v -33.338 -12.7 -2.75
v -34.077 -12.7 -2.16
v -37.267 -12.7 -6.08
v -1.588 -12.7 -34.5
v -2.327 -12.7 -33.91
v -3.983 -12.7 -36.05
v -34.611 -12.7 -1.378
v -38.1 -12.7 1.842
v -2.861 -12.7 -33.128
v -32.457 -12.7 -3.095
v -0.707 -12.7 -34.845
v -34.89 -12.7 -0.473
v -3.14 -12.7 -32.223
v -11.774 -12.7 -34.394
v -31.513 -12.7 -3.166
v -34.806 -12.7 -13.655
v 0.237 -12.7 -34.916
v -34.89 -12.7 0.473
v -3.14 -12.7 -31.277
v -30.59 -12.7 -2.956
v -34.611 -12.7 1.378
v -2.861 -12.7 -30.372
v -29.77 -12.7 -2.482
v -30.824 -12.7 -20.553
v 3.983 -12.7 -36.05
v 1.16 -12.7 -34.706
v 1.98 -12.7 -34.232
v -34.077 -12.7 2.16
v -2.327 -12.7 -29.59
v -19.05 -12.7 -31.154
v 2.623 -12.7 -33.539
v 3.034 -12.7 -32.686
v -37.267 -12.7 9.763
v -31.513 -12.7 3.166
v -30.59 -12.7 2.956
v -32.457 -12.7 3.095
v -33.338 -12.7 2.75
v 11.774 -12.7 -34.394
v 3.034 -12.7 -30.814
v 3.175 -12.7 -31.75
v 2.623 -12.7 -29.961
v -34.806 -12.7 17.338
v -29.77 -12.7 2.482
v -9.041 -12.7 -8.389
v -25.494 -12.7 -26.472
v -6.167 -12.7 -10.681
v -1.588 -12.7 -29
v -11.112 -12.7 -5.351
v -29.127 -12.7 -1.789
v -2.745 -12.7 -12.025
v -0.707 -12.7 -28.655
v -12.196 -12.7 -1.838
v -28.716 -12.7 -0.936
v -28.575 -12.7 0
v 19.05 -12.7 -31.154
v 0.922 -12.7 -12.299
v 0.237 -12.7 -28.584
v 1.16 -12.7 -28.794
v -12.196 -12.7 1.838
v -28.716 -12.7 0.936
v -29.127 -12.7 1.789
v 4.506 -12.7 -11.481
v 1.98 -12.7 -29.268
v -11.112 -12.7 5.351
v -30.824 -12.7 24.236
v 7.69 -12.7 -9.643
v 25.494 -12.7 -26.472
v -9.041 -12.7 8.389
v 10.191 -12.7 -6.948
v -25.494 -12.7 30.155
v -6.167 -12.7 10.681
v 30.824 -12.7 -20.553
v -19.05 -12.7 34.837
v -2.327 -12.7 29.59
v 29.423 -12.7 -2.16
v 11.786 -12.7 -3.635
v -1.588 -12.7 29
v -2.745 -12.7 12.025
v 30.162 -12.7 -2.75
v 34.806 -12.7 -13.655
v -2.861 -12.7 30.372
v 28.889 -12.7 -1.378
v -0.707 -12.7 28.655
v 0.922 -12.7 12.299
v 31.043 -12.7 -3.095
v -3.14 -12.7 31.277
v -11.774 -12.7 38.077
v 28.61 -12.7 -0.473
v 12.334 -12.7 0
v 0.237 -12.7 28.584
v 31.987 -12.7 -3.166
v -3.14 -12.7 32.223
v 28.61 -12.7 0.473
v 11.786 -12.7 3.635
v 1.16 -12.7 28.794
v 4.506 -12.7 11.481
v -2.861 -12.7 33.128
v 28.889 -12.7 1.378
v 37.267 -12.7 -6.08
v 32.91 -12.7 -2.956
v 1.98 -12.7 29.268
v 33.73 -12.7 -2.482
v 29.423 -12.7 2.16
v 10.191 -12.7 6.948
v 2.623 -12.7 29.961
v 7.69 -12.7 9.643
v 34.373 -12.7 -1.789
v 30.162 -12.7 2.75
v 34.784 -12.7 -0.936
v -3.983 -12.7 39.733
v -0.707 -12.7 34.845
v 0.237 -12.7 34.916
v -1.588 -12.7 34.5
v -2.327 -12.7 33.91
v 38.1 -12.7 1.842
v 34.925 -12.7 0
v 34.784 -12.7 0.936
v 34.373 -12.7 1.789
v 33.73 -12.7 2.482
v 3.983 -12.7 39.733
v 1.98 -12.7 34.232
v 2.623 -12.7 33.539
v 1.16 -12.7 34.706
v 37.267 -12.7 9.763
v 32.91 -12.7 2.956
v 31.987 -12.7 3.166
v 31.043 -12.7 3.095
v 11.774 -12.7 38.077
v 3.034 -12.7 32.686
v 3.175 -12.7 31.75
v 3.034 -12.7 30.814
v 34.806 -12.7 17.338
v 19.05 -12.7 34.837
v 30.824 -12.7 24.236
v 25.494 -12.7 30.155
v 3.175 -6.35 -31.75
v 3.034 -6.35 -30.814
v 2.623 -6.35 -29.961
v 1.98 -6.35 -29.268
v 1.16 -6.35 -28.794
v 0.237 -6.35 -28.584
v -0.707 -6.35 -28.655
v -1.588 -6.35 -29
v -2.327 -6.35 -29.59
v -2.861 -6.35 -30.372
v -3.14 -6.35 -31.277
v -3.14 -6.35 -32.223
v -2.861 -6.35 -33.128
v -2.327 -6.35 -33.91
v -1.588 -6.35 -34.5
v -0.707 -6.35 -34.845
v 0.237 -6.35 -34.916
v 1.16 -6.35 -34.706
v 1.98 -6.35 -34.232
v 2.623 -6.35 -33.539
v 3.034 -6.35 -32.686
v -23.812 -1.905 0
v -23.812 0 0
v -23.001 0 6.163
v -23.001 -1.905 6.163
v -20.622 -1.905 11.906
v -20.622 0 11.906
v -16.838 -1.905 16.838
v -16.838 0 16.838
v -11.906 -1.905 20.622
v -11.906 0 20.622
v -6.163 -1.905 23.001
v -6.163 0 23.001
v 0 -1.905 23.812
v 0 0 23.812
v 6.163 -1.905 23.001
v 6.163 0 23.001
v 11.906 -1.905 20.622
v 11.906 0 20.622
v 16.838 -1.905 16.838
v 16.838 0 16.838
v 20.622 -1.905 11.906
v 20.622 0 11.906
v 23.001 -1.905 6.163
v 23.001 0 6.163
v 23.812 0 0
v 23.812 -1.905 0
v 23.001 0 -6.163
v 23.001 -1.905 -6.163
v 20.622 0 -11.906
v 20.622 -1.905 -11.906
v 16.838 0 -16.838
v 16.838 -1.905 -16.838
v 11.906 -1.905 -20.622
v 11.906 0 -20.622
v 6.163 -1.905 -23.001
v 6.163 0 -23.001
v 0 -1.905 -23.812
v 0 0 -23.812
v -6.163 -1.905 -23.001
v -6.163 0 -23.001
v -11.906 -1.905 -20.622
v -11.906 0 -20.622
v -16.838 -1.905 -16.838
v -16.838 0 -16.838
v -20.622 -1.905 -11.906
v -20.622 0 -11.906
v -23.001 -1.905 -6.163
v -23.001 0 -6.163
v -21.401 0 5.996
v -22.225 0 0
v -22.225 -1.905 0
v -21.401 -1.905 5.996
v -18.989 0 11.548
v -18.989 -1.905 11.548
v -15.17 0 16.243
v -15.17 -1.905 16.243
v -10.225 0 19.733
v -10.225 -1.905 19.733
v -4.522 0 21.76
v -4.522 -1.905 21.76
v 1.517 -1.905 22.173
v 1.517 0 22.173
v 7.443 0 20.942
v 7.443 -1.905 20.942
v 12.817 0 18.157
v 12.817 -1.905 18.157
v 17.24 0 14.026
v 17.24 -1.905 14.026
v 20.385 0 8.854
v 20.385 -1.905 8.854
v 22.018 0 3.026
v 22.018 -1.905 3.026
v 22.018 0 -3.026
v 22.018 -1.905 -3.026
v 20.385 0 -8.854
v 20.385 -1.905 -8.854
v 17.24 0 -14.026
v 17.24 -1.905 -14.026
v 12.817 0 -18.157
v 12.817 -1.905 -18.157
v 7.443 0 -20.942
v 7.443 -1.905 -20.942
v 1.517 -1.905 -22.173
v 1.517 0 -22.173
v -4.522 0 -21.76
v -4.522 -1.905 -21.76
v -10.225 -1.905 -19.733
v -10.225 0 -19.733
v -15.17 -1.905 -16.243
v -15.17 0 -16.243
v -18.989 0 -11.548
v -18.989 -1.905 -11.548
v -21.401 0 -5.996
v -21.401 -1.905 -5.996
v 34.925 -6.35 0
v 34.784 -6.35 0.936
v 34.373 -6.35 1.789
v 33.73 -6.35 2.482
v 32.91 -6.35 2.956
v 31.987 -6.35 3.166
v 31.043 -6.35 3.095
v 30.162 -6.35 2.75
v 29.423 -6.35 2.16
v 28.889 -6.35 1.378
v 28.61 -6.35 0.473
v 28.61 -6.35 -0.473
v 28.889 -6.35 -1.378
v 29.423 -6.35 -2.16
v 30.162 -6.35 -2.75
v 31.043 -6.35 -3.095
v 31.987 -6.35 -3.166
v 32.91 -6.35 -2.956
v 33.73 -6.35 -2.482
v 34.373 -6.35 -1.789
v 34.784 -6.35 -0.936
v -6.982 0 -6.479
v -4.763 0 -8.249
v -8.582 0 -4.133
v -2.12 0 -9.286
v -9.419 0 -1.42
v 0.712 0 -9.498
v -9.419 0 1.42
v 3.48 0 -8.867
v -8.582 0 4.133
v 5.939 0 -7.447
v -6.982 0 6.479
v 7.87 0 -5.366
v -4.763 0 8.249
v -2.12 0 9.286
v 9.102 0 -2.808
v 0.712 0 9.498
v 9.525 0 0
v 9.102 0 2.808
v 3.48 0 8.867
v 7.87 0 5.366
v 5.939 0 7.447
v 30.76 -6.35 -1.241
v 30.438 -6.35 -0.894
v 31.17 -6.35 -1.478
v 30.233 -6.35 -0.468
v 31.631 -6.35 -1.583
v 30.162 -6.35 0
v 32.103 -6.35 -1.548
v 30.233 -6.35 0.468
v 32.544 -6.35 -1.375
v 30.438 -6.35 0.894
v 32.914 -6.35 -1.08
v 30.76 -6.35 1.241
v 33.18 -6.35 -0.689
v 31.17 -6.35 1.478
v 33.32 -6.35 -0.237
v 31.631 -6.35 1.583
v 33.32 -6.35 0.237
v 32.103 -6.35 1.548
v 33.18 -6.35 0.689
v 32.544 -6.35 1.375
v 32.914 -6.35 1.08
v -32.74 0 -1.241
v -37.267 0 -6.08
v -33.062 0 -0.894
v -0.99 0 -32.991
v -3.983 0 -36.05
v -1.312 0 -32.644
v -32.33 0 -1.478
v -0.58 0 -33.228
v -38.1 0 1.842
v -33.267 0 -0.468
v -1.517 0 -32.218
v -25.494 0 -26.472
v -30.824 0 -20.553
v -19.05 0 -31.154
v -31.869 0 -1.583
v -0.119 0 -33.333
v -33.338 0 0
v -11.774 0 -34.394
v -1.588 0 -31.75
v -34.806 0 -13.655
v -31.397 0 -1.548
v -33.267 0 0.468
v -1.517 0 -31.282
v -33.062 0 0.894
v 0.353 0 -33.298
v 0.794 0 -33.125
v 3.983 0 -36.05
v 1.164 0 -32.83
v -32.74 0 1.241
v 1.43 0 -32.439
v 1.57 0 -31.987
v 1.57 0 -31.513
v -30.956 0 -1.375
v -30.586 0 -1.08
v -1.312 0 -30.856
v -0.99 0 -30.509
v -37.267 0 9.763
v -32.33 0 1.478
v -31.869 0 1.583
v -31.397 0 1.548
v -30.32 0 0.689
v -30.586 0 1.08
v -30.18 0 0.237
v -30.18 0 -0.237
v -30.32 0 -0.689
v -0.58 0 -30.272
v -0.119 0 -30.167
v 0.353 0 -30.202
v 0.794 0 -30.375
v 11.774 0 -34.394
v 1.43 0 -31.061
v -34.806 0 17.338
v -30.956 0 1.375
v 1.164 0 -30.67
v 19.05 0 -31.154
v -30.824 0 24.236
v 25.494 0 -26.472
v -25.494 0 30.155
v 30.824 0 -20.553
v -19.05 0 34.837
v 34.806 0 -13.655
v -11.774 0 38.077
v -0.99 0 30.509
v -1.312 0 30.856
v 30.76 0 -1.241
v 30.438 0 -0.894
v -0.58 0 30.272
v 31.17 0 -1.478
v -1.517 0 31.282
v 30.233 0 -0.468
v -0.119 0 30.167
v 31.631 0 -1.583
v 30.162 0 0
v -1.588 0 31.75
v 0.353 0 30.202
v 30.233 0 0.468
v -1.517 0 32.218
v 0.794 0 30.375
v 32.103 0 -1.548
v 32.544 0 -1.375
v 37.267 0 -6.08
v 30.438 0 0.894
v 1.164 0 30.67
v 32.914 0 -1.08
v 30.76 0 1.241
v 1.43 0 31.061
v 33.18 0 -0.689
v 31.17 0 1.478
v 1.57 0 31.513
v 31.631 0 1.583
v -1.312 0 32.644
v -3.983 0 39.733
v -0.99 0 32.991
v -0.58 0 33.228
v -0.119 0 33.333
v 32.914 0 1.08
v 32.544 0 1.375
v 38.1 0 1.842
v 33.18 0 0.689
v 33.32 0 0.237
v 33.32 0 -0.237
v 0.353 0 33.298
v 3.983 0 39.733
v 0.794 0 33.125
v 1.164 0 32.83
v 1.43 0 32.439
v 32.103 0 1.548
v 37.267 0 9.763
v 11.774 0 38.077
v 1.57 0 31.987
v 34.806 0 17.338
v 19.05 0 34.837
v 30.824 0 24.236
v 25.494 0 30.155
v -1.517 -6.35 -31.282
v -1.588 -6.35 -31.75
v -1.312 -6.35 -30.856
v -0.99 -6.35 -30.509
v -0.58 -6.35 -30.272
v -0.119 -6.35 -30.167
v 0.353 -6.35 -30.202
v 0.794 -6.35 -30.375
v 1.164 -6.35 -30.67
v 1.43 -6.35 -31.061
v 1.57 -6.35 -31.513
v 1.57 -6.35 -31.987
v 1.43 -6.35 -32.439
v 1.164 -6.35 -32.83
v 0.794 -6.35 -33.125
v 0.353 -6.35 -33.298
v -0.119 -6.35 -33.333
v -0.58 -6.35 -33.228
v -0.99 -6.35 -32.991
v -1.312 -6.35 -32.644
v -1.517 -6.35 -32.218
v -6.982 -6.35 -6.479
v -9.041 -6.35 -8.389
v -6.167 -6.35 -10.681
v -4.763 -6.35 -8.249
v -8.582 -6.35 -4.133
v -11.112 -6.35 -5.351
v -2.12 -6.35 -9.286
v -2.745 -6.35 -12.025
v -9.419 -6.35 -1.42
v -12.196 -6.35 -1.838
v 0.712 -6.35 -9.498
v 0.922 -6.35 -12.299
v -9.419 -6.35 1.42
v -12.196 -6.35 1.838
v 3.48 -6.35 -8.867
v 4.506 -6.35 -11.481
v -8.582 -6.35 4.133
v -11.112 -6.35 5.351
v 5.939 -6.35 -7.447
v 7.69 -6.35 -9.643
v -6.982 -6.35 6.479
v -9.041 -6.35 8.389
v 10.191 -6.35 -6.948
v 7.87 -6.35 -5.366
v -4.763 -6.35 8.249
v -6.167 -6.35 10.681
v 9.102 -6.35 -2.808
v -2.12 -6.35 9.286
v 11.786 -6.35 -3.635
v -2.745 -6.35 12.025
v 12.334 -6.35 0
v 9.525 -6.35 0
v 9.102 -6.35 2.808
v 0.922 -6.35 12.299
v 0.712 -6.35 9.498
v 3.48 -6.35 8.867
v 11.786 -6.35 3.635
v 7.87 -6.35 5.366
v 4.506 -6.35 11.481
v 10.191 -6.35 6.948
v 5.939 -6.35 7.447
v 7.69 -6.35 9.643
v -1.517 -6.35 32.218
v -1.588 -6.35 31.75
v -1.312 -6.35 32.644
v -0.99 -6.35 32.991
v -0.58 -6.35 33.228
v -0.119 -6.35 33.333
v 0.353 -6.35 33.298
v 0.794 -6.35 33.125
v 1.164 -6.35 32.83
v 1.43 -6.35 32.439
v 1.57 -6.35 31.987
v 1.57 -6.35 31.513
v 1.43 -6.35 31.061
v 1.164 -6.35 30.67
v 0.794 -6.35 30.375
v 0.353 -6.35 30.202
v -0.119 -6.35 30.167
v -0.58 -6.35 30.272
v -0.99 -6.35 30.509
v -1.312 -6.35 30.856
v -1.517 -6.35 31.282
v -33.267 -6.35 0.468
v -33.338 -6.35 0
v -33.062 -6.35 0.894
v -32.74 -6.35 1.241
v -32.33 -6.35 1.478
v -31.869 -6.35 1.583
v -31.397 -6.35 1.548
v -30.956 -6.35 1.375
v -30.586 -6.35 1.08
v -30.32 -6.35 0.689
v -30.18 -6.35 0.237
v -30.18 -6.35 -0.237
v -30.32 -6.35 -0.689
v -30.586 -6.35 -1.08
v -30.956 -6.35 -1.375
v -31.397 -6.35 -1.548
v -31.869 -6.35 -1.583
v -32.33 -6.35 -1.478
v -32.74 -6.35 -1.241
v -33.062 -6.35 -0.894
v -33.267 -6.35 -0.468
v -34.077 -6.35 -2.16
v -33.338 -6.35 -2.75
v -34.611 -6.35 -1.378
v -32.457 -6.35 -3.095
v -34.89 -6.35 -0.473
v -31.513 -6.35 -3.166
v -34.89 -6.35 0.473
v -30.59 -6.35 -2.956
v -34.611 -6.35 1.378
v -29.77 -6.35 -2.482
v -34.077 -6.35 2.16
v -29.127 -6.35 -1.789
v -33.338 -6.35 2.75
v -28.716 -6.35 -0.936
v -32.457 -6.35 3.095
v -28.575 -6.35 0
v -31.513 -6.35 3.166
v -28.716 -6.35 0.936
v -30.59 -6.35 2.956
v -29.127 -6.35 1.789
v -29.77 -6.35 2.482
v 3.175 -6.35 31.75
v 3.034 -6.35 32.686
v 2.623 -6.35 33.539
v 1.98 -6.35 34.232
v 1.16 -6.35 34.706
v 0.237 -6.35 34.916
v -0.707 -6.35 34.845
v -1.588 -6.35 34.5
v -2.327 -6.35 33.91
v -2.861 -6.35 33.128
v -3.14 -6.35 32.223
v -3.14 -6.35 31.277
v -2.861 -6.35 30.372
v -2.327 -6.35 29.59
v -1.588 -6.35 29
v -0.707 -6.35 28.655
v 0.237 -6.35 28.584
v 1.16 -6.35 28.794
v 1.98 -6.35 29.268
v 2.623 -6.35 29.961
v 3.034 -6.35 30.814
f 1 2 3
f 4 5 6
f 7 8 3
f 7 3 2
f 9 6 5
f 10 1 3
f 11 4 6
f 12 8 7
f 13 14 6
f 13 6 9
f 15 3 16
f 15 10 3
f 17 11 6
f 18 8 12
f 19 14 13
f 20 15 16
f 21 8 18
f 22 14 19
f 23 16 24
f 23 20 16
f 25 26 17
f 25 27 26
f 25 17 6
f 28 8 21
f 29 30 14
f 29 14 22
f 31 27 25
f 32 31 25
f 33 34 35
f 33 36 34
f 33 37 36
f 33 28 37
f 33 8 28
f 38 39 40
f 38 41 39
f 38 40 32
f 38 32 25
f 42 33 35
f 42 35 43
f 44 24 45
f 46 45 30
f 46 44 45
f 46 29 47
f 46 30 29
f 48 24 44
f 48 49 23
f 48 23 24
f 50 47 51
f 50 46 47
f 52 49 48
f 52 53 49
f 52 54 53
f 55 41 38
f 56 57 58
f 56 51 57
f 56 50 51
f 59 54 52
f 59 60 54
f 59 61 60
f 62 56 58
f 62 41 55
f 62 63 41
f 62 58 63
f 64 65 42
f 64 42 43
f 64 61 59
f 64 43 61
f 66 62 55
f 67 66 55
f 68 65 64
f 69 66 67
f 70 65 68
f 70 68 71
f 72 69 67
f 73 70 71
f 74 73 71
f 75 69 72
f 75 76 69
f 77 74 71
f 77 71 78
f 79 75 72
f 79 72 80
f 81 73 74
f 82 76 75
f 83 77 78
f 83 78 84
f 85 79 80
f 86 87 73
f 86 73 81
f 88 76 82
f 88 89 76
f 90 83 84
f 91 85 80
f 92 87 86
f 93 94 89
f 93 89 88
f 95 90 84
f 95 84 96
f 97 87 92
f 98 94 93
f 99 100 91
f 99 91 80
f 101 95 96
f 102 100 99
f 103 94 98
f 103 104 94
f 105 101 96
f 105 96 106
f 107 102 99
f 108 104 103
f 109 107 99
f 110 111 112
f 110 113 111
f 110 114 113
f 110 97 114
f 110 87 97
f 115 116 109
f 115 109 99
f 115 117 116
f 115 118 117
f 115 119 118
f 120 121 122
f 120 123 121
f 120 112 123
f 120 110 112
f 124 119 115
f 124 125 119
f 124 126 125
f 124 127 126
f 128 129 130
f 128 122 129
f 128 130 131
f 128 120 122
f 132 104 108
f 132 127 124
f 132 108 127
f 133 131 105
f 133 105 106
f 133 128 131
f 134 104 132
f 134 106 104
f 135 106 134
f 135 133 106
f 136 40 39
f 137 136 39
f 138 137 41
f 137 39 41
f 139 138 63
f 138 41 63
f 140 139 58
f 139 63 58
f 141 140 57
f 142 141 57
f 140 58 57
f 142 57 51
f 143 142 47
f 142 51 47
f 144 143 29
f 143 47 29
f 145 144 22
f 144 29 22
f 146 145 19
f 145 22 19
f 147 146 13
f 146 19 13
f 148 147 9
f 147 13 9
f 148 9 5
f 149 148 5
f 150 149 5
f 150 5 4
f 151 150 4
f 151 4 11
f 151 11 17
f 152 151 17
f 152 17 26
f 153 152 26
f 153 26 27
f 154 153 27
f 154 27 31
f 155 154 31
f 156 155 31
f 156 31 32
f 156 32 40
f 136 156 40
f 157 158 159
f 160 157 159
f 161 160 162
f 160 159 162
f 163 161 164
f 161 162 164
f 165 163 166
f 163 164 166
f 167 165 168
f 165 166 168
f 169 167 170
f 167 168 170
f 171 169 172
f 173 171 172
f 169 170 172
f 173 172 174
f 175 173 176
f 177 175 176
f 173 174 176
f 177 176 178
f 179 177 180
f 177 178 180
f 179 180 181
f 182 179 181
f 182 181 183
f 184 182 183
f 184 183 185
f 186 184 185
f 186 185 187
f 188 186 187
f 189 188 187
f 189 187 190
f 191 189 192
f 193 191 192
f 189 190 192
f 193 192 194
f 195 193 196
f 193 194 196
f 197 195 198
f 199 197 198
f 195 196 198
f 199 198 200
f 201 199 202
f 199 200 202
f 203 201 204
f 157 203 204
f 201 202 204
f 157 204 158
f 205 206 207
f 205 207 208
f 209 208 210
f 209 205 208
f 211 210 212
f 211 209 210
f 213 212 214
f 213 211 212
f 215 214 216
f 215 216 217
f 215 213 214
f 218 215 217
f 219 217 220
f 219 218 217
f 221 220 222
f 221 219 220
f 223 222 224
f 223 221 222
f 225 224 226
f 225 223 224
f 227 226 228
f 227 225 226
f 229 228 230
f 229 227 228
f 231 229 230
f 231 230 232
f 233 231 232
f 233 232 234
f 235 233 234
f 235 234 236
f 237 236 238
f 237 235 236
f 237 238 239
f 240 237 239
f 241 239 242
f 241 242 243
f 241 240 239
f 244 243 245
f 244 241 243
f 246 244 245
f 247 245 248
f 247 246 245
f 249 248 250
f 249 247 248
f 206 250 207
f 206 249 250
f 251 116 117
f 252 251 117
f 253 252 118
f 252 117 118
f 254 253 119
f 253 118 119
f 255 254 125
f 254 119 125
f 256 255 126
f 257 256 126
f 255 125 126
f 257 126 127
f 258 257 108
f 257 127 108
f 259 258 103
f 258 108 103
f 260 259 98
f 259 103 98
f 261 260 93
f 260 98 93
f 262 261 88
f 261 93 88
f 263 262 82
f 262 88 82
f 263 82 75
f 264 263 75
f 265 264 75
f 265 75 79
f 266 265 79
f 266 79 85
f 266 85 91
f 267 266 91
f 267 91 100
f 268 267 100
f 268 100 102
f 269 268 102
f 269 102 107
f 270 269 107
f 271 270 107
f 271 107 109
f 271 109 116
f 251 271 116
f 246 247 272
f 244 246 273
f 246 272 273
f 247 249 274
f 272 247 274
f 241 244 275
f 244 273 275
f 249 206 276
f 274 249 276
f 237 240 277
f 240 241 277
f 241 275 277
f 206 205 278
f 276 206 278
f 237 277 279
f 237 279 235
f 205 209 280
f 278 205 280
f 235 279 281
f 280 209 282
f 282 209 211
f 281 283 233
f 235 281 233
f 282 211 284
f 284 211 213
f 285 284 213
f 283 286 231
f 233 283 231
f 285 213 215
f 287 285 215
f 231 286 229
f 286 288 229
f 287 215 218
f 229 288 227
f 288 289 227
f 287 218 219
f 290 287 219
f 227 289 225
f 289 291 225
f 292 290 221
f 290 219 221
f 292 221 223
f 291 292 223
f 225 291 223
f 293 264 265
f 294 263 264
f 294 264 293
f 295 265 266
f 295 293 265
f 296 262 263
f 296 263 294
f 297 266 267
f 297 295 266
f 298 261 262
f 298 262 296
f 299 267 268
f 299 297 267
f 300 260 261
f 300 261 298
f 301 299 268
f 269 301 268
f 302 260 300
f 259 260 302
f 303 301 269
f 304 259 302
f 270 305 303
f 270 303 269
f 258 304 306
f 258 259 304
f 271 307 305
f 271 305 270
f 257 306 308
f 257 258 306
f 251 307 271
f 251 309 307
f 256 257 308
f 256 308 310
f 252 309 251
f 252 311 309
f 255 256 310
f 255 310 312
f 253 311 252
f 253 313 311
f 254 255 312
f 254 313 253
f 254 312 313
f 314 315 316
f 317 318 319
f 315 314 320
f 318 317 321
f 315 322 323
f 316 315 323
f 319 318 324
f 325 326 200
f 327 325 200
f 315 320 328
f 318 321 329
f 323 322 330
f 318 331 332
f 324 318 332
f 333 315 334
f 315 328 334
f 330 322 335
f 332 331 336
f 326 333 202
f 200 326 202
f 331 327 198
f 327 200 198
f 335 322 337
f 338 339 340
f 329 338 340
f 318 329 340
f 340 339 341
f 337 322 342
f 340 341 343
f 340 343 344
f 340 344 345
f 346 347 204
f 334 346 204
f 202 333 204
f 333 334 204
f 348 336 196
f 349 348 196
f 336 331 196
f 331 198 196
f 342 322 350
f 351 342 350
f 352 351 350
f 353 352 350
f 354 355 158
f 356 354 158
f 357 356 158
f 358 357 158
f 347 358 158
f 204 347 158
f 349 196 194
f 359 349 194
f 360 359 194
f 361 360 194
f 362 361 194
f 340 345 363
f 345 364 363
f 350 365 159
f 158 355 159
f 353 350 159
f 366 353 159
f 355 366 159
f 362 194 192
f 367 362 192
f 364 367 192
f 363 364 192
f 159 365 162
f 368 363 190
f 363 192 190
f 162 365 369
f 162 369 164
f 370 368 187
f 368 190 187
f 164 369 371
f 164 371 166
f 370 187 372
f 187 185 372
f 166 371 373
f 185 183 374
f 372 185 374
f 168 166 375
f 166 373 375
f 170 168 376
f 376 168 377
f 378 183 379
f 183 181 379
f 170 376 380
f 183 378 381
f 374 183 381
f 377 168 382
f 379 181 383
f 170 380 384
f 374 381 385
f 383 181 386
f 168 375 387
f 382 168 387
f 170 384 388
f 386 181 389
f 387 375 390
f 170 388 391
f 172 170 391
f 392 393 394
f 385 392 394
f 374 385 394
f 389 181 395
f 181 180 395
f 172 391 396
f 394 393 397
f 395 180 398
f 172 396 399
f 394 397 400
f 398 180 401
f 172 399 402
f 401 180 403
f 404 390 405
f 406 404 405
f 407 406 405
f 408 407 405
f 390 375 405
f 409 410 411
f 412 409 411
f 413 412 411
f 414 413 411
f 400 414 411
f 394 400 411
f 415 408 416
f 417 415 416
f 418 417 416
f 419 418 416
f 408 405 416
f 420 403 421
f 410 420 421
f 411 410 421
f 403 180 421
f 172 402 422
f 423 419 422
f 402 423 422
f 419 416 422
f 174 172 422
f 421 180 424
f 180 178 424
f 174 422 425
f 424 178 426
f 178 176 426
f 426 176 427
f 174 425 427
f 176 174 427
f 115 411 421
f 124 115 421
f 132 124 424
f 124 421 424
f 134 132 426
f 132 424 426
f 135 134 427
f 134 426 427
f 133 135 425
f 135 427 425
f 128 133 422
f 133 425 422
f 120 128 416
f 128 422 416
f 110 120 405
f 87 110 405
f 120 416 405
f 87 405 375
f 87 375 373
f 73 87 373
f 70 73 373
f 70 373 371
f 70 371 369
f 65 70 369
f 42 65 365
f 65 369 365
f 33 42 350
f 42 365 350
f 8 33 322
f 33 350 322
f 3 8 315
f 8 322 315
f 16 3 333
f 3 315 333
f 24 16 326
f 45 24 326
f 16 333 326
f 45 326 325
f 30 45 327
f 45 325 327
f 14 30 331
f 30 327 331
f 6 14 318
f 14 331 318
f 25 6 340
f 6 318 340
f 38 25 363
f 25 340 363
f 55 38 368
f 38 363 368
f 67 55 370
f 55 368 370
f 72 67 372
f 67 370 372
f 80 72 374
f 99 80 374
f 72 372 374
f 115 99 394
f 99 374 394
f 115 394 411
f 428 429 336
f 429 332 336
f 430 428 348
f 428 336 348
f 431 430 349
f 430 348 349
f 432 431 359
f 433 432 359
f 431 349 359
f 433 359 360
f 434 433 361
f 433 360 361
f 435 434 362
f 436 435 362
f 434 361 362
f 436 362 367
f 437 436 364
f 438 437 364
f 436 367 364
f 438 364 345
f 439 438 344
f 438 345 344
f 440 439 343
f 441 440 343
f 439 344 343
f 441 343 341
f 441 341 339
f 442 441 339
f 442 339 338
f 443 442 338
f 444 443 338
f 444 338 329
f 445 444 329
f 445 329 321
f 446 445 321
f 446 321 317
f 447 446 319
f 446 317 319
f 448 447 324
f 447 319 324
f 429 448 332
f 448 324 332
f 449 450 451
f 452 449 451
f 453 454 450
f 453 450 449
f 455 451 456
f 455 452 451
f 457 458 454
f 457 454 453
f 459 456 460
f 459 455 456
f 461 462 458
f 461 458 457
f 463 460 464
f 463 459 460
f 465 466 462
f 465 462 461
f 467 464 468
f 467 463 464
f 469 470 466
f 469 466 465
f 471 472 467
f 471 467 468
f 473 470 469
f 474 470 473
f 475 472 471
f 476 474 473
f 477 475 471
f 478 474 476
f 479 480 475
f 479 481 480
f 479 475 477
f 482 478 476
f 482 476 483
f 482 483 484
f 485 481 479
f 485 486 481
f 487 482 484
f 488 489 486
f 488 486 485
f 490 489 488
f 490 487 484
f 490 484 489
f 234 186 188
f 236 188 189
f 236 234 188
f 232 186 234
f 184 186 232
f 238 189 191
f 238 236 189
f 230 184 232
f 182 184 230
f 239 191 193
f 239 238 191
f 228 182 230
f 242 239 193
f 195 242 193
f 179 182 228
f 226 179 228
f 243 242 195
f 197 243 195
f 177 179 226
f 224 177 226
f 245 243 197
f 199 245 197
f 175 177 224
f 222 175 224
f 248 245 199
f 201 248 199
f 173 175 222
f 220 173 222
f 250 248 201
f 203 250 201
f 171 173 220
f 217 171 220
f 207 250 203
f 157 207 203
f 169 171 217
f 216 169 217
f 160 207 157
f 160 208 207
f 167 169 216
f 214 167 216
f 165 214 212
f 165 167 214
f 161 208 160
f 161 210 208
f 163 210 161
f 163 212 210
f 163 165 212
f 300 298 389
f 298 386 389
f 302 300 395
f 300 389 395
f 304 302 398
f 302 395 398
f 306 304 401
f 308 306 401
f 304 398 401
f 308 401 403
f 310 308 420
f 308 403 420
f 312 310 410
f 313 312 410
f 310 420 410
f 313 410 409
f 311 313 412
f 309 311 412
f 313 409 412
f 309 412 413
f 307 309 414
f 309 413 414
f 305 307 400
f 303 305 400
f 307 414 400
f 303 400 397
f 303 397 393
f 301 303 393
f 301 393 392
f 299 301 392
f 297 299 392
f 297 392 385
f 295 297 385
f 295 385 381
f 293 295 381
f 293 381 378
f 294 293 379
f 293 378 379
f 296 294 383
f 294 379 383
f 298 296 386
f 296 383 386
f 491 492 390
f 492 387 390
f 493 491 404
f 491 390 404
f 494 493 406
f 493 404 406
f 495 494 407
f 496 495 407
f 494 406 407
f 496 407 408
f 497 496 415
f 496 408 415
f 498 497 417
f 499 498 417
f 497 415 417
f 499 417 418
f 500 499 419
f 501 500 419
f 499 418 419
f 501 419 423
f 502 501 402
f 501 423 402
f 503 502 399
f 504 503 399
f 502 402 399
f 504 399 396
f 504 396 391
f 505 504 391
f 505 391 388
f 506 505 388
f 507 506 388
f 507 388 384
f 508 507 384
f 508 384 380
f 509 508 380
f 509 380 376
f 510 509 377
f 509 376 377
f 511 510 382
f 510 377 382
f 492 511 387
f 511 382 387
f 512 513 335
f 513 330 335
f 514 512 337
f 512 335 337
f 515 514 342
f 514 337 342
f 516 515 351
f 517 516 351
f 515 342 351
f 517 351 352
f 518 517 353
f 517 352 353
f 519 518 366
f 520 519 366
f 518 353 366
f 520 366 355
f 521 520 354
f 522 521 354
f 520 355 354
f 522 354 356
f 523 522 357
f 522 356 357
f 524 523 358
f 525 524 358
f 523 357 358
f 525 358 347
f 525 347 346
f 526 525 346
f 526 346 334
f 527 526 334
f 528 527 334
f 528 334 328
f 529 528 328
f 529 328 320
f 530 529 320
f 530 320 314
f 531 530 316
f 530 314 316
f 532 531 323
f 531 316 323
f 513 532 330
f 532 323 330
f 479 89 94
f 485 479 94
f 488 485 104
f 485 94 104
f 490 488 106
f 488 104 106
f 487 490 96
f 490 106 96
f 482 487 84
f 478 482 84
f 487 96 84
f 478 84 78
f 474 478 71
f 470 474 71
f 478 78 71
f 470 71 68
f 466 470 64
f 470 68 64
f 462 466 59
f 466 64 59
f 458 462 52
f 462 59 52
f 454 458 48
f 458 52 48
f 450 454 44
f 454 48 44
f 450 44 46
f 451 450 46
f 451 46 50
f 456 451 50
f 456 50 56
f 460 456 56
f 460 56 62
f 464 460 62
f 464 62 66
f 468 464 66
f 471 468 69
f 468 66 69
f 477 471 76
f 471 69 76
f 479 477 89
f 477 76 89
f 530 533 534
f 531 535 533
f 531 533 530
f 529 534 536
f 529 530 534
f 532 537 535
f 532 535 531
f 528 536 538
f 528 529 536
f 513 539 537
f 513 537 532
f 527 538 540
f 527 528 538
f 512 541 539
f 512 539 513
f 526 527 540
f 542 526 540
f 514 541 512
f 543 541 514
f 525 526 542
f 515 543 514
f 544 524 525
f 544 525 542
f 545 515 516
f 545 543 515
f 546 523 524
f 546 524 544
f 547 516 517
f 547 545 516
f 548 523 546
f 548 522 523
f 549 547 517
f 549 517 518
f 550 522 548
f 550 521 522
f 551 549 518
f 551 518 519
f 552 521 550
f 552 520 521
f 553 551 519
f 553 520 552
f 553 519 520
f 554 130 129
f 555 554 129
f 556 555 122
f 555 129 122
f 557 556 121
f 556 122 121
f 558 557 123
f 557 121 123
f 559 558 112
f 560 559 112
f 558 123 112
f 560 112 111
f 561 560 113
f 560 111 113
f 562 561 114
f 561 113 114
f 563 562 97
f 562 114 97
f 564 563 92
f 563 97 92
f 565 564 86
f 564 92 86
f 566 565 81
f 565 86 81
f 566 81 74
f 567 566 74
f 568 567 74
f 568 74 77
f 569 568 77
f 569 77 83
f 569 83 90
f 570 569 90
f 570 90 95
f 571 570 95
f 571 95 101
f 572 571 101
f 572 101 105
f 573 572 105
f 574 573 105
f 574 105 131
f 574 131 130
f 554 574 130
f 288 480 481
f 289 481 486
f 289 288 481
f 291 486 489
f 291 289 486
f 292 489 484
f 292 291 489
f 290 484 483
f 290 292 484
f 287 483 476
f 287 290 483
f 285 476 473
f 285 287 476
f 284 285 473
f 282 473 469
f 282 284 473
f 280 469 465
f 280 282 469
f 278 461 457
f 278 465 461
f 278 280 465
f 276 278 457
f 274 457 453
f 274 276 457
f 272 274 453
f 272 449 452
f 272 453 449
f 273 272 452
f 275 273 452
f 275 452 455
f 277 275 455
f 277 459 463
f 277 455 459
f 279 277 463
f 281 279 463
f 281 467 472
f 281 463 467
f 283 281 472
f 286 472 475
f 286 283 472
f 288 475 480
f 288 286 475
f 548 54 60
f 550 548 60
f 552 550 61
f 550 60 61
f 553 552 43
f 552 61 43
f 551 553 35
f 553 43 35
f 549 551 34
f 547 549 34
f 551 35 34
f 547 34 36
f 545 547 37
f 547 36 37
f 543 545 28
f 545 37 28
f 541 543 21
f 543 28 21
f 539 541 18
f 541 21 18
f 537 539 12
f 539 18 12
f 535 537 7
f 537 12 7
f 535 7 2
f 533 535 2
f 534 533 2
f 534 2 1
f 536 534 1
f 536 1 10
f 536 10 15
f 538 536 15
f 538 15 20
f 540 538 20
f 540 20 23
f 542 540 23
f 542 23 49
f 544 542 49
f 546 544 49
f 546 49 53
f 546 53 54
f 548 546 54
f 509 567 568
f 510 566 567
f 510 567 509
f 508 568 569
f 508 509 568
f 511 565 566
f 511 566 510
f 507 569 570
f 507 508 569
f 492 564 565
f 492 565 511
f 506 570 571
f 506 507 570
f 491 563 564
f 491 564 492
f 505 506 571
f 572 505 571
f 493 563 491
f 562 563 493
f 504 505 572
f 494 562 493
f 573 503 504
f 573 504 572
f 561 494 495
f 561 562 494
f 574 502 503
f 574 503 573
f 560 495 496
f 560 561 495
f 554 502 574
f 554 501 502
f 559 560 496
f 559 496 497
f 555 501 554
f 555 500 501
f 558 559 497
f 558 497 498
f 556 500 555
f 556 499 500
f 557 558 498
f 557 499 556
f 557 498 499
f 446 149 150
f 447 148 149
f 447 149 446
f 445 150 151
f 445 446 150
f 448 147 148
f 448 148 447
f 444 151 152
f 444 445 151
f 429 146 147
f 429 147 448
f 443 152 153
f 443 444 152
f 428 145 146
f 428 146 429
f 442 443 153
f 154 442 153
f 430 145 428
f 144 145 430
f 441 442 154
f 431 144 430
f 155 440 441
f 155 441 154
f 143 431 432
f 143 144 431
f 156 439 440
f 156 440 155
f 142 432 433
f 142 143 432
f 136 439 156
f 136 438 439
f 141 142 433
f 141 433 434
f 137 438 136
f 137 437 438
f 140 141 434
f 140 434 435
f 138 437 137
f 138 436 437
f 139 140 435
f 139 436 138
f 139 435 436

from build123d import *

# Parameters (mm, degrees)
F0_R           = 38.1
F0_R_2         = 9.525
F1_DEPTH       = 12.7
F2_R           = 12.333781
F3_DEPTH       = 6.35
F5_D           = 3.175
F5_CBORE_D     = 6.35
F5_CBORE_DEPTH = 6.35
F6_R           = 23.8125
F6_R_2         = 22.225
F7_DEPTH       = 1.905


with BuildPart() as f1:
    # F0 (on Front) → F1 (new body)
    with BuildSketch(Plane.XZ):
        with Locations((0, 1.841663)):
            Circle(F0_R)
        Circle(F0_R_2, mode=Mode.SUBTRACT)
    extrude(amount=F1_DEPTH)

    # F2 (on face) → F3 (cut)
    with BuildSketch(Plane.XZ.offset(12.7)):
        Circle(F2_R)
    extrude(amount=-F3_DEPTH, mode=Mode.SUBTRACT)

    # F5 (through all)
    with Locations(Plane.XZ.offset(12.7)):
        with Locations((0, 31.75), (31.75, 0), (0, -31.75), (-31.75, 0)):
            CounterBoreHole(F5_D / 2, F5_CBORE_D / 2, F5_CBORE_DEPTH)

    # F6 (on face) → F7 (cut)
    with BuildSketch(Plane(origin=(0, 0, 0), x_dir=(-1, 0, 0), z_dir=(0, 1, 0))):
        Circle(F6_R)
        Circle(F6_R_2, mode=Mode.SUBTRACT)
    extrude(amount=-F7_DEPTH, mode=Mode.SUBTRACT)


solid = f1.part
